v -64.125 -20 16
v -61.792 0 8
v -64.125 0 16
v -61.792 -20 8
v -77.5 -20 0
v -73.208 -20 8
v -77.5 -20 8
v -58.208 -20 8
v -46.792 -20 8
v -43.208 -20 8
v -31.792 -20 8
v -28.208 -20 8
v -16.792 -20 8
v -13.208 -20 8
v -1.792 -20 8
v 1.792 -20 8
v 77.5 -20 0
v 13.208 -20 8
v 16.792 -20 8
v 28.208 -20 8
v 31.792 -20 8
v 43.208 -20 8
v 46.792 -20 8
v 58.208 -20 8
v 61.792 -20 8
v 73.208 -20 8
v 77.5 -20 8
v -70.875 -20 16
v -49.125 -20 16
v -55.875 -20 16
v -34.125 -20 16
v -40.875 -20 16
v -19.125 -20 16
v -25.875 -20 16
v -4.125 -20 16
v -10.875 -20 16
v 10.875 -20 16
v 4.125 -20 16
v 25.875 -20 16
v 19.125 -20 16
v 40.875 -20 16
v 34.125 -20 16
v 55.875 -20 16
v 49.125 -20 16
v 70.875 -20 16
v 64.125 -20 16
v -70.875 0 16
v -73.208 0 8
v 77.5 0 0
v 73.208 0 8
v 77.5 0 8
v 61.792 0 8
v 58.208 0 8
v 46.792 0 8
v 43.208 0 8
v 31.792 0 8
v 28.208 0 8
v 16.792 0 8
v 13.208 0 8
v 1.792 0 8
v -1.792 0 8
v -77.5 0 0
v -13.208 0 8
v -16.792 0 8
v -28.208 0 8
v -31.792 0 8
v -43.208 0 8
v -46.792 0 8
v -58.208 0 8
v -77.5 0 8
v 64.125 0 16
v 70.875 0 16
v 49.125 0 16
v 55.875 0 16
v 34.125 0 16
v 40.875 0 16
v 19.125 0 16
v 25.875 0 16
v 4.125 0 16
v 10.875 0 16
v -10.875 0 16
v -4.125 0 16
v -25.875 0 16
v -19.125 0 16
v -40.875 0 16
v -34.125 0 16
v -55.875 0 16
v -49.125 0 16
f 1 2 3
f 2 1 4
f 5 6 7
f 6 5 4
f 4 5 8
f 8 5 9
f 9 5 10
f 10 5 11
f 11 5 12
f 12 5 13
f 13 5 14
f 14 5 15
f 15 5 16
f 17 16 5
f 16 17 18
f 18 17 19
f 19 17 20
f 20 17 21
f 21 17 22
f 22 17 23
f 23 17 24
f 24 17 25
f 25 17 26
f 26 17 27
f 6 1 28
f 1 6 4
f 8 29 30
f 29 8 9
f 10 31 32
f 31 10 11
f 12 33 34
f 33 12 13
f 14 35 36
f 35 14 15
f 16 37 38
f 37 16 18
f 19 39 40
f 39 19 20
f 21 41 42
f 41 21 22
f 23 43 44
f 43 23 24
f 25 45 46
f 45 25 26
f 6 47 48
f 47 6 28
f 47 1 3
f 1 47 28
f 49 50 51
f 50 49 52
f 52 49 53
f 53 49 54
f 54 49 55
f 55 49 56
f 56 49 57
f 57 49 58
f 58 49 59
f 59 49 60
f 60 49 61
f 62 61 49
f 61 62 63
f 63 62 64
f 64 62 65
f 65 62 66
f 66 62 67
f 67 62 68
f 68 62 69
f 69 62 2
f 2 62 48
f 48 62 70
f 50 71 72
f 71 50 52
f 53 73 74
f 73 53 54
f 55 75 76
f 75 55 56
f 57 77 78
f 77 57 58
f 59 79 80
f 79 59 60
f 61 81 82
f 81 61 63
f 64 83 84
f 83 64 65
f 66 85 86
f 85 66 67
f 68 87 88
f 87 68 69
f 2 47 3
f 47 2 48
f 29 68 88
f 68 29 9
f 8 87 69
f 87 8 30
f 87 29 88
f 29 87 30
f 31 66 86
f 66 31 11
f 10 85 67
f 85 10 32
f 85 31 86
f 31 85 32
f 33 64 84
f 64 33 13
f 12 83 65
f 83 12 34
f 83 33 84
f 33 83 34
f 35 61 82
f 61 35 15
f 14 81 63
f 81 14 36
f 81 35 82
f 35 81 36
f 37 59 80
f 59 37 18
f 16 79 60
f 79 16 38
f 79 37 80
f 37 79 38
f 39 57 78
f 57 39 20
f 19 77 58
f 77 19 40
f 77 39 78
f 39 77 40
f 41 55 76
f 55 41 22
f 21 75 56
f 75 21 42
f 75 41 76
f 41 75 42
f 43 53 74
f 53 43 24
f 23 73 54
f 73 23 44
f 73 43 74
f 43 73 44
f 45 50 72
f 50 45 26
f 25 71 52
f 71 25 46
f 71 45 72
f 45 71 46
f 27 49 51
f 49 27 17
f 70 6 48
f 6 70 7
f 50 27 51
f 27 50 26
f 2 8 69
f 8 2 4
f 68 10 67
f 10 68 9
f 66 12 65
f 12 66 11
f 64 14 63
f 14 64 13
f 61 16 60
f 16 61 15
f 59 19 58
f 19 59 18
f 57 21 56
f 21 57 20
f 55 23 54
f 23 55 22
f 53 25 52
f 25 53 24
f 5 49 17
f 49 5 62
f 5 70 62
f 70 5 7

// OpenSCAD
$fn = 32;

// ----------------------------------------------------------------------
// Toothed rack, 10 teeth
// 15 mm pitch, 8 mm teeth
// ----------------------------------------------------------------------

// --- parameters (mm) ---
bar_w = 20;      // bar width (Y)
bar_h = 8;       // bar height (Z)
teeth = 10;      // number of teeth
pitch = 15;      // tooth pitch
tooth_h = 8;     // tooth height above the bar
root_w = 12;     // tooth width at the root
crest_w = 6.75;  // tooth width at the crest

// --- derived feature positions (mm) ---
span = (teeth - 1) * pitch;  // = 135   distance between the outer teeth
bar_l = span + root_w + 8;   // = 155   bar length: teeth plus 4 mm at each end
tooth_x = -span / 2;         // = -67.5   X of the first tooth
height = bar_h + tooth_h;    // = 16   overall height
feature_centers = [
  [tooth_x + 0 * pitch, -bar_w / 2],
  [tooth_x + 1 * pitch, -bar_w / 2],
  [tooth_x + 2 * pitch, -bar_w / 2],
  [tooth_x + 3 * pitch, -bar_w / 2],
  [tooth_x + 4 * pitch, -bar_w / 2],
  [tooth_x + 5 * pitch, -bar_w / 2],
  [tooth_x + 6 * pitch, -bar_w / 2],
  [tooth_x + 7 * pitch, -bar_w / 2],
  [tooth_x + 8 * pitch, -bar_w / 2],
  [tooth_x + 9 * pitch, -bar_w / 2]
];   // tooth centre line, drives the tooth loop

// bar with a rack of teeth, one extruded trapezoium per centre
module rack_tooth() {
  linear_extrude(height = bar_w)
    polygon(points = [
      [0, 0],
      [root_w, 0],
      [root_w / 2 + crest_w / 2, tooth_h + 1],
      [root_w / 2 - crest_w / 2, tooth_h + 1]
    ]);
}

union() {
  translate([-bar_l / 2, -bar_w, 0]) cube([bar_l, bar_w, bar_h]);
  for (centre = feature_centers)
    translate([centre[0] - root_w / 2, 0, bar_h - 1]) rotate([90, 0, 0]) rack_tooth();
}
